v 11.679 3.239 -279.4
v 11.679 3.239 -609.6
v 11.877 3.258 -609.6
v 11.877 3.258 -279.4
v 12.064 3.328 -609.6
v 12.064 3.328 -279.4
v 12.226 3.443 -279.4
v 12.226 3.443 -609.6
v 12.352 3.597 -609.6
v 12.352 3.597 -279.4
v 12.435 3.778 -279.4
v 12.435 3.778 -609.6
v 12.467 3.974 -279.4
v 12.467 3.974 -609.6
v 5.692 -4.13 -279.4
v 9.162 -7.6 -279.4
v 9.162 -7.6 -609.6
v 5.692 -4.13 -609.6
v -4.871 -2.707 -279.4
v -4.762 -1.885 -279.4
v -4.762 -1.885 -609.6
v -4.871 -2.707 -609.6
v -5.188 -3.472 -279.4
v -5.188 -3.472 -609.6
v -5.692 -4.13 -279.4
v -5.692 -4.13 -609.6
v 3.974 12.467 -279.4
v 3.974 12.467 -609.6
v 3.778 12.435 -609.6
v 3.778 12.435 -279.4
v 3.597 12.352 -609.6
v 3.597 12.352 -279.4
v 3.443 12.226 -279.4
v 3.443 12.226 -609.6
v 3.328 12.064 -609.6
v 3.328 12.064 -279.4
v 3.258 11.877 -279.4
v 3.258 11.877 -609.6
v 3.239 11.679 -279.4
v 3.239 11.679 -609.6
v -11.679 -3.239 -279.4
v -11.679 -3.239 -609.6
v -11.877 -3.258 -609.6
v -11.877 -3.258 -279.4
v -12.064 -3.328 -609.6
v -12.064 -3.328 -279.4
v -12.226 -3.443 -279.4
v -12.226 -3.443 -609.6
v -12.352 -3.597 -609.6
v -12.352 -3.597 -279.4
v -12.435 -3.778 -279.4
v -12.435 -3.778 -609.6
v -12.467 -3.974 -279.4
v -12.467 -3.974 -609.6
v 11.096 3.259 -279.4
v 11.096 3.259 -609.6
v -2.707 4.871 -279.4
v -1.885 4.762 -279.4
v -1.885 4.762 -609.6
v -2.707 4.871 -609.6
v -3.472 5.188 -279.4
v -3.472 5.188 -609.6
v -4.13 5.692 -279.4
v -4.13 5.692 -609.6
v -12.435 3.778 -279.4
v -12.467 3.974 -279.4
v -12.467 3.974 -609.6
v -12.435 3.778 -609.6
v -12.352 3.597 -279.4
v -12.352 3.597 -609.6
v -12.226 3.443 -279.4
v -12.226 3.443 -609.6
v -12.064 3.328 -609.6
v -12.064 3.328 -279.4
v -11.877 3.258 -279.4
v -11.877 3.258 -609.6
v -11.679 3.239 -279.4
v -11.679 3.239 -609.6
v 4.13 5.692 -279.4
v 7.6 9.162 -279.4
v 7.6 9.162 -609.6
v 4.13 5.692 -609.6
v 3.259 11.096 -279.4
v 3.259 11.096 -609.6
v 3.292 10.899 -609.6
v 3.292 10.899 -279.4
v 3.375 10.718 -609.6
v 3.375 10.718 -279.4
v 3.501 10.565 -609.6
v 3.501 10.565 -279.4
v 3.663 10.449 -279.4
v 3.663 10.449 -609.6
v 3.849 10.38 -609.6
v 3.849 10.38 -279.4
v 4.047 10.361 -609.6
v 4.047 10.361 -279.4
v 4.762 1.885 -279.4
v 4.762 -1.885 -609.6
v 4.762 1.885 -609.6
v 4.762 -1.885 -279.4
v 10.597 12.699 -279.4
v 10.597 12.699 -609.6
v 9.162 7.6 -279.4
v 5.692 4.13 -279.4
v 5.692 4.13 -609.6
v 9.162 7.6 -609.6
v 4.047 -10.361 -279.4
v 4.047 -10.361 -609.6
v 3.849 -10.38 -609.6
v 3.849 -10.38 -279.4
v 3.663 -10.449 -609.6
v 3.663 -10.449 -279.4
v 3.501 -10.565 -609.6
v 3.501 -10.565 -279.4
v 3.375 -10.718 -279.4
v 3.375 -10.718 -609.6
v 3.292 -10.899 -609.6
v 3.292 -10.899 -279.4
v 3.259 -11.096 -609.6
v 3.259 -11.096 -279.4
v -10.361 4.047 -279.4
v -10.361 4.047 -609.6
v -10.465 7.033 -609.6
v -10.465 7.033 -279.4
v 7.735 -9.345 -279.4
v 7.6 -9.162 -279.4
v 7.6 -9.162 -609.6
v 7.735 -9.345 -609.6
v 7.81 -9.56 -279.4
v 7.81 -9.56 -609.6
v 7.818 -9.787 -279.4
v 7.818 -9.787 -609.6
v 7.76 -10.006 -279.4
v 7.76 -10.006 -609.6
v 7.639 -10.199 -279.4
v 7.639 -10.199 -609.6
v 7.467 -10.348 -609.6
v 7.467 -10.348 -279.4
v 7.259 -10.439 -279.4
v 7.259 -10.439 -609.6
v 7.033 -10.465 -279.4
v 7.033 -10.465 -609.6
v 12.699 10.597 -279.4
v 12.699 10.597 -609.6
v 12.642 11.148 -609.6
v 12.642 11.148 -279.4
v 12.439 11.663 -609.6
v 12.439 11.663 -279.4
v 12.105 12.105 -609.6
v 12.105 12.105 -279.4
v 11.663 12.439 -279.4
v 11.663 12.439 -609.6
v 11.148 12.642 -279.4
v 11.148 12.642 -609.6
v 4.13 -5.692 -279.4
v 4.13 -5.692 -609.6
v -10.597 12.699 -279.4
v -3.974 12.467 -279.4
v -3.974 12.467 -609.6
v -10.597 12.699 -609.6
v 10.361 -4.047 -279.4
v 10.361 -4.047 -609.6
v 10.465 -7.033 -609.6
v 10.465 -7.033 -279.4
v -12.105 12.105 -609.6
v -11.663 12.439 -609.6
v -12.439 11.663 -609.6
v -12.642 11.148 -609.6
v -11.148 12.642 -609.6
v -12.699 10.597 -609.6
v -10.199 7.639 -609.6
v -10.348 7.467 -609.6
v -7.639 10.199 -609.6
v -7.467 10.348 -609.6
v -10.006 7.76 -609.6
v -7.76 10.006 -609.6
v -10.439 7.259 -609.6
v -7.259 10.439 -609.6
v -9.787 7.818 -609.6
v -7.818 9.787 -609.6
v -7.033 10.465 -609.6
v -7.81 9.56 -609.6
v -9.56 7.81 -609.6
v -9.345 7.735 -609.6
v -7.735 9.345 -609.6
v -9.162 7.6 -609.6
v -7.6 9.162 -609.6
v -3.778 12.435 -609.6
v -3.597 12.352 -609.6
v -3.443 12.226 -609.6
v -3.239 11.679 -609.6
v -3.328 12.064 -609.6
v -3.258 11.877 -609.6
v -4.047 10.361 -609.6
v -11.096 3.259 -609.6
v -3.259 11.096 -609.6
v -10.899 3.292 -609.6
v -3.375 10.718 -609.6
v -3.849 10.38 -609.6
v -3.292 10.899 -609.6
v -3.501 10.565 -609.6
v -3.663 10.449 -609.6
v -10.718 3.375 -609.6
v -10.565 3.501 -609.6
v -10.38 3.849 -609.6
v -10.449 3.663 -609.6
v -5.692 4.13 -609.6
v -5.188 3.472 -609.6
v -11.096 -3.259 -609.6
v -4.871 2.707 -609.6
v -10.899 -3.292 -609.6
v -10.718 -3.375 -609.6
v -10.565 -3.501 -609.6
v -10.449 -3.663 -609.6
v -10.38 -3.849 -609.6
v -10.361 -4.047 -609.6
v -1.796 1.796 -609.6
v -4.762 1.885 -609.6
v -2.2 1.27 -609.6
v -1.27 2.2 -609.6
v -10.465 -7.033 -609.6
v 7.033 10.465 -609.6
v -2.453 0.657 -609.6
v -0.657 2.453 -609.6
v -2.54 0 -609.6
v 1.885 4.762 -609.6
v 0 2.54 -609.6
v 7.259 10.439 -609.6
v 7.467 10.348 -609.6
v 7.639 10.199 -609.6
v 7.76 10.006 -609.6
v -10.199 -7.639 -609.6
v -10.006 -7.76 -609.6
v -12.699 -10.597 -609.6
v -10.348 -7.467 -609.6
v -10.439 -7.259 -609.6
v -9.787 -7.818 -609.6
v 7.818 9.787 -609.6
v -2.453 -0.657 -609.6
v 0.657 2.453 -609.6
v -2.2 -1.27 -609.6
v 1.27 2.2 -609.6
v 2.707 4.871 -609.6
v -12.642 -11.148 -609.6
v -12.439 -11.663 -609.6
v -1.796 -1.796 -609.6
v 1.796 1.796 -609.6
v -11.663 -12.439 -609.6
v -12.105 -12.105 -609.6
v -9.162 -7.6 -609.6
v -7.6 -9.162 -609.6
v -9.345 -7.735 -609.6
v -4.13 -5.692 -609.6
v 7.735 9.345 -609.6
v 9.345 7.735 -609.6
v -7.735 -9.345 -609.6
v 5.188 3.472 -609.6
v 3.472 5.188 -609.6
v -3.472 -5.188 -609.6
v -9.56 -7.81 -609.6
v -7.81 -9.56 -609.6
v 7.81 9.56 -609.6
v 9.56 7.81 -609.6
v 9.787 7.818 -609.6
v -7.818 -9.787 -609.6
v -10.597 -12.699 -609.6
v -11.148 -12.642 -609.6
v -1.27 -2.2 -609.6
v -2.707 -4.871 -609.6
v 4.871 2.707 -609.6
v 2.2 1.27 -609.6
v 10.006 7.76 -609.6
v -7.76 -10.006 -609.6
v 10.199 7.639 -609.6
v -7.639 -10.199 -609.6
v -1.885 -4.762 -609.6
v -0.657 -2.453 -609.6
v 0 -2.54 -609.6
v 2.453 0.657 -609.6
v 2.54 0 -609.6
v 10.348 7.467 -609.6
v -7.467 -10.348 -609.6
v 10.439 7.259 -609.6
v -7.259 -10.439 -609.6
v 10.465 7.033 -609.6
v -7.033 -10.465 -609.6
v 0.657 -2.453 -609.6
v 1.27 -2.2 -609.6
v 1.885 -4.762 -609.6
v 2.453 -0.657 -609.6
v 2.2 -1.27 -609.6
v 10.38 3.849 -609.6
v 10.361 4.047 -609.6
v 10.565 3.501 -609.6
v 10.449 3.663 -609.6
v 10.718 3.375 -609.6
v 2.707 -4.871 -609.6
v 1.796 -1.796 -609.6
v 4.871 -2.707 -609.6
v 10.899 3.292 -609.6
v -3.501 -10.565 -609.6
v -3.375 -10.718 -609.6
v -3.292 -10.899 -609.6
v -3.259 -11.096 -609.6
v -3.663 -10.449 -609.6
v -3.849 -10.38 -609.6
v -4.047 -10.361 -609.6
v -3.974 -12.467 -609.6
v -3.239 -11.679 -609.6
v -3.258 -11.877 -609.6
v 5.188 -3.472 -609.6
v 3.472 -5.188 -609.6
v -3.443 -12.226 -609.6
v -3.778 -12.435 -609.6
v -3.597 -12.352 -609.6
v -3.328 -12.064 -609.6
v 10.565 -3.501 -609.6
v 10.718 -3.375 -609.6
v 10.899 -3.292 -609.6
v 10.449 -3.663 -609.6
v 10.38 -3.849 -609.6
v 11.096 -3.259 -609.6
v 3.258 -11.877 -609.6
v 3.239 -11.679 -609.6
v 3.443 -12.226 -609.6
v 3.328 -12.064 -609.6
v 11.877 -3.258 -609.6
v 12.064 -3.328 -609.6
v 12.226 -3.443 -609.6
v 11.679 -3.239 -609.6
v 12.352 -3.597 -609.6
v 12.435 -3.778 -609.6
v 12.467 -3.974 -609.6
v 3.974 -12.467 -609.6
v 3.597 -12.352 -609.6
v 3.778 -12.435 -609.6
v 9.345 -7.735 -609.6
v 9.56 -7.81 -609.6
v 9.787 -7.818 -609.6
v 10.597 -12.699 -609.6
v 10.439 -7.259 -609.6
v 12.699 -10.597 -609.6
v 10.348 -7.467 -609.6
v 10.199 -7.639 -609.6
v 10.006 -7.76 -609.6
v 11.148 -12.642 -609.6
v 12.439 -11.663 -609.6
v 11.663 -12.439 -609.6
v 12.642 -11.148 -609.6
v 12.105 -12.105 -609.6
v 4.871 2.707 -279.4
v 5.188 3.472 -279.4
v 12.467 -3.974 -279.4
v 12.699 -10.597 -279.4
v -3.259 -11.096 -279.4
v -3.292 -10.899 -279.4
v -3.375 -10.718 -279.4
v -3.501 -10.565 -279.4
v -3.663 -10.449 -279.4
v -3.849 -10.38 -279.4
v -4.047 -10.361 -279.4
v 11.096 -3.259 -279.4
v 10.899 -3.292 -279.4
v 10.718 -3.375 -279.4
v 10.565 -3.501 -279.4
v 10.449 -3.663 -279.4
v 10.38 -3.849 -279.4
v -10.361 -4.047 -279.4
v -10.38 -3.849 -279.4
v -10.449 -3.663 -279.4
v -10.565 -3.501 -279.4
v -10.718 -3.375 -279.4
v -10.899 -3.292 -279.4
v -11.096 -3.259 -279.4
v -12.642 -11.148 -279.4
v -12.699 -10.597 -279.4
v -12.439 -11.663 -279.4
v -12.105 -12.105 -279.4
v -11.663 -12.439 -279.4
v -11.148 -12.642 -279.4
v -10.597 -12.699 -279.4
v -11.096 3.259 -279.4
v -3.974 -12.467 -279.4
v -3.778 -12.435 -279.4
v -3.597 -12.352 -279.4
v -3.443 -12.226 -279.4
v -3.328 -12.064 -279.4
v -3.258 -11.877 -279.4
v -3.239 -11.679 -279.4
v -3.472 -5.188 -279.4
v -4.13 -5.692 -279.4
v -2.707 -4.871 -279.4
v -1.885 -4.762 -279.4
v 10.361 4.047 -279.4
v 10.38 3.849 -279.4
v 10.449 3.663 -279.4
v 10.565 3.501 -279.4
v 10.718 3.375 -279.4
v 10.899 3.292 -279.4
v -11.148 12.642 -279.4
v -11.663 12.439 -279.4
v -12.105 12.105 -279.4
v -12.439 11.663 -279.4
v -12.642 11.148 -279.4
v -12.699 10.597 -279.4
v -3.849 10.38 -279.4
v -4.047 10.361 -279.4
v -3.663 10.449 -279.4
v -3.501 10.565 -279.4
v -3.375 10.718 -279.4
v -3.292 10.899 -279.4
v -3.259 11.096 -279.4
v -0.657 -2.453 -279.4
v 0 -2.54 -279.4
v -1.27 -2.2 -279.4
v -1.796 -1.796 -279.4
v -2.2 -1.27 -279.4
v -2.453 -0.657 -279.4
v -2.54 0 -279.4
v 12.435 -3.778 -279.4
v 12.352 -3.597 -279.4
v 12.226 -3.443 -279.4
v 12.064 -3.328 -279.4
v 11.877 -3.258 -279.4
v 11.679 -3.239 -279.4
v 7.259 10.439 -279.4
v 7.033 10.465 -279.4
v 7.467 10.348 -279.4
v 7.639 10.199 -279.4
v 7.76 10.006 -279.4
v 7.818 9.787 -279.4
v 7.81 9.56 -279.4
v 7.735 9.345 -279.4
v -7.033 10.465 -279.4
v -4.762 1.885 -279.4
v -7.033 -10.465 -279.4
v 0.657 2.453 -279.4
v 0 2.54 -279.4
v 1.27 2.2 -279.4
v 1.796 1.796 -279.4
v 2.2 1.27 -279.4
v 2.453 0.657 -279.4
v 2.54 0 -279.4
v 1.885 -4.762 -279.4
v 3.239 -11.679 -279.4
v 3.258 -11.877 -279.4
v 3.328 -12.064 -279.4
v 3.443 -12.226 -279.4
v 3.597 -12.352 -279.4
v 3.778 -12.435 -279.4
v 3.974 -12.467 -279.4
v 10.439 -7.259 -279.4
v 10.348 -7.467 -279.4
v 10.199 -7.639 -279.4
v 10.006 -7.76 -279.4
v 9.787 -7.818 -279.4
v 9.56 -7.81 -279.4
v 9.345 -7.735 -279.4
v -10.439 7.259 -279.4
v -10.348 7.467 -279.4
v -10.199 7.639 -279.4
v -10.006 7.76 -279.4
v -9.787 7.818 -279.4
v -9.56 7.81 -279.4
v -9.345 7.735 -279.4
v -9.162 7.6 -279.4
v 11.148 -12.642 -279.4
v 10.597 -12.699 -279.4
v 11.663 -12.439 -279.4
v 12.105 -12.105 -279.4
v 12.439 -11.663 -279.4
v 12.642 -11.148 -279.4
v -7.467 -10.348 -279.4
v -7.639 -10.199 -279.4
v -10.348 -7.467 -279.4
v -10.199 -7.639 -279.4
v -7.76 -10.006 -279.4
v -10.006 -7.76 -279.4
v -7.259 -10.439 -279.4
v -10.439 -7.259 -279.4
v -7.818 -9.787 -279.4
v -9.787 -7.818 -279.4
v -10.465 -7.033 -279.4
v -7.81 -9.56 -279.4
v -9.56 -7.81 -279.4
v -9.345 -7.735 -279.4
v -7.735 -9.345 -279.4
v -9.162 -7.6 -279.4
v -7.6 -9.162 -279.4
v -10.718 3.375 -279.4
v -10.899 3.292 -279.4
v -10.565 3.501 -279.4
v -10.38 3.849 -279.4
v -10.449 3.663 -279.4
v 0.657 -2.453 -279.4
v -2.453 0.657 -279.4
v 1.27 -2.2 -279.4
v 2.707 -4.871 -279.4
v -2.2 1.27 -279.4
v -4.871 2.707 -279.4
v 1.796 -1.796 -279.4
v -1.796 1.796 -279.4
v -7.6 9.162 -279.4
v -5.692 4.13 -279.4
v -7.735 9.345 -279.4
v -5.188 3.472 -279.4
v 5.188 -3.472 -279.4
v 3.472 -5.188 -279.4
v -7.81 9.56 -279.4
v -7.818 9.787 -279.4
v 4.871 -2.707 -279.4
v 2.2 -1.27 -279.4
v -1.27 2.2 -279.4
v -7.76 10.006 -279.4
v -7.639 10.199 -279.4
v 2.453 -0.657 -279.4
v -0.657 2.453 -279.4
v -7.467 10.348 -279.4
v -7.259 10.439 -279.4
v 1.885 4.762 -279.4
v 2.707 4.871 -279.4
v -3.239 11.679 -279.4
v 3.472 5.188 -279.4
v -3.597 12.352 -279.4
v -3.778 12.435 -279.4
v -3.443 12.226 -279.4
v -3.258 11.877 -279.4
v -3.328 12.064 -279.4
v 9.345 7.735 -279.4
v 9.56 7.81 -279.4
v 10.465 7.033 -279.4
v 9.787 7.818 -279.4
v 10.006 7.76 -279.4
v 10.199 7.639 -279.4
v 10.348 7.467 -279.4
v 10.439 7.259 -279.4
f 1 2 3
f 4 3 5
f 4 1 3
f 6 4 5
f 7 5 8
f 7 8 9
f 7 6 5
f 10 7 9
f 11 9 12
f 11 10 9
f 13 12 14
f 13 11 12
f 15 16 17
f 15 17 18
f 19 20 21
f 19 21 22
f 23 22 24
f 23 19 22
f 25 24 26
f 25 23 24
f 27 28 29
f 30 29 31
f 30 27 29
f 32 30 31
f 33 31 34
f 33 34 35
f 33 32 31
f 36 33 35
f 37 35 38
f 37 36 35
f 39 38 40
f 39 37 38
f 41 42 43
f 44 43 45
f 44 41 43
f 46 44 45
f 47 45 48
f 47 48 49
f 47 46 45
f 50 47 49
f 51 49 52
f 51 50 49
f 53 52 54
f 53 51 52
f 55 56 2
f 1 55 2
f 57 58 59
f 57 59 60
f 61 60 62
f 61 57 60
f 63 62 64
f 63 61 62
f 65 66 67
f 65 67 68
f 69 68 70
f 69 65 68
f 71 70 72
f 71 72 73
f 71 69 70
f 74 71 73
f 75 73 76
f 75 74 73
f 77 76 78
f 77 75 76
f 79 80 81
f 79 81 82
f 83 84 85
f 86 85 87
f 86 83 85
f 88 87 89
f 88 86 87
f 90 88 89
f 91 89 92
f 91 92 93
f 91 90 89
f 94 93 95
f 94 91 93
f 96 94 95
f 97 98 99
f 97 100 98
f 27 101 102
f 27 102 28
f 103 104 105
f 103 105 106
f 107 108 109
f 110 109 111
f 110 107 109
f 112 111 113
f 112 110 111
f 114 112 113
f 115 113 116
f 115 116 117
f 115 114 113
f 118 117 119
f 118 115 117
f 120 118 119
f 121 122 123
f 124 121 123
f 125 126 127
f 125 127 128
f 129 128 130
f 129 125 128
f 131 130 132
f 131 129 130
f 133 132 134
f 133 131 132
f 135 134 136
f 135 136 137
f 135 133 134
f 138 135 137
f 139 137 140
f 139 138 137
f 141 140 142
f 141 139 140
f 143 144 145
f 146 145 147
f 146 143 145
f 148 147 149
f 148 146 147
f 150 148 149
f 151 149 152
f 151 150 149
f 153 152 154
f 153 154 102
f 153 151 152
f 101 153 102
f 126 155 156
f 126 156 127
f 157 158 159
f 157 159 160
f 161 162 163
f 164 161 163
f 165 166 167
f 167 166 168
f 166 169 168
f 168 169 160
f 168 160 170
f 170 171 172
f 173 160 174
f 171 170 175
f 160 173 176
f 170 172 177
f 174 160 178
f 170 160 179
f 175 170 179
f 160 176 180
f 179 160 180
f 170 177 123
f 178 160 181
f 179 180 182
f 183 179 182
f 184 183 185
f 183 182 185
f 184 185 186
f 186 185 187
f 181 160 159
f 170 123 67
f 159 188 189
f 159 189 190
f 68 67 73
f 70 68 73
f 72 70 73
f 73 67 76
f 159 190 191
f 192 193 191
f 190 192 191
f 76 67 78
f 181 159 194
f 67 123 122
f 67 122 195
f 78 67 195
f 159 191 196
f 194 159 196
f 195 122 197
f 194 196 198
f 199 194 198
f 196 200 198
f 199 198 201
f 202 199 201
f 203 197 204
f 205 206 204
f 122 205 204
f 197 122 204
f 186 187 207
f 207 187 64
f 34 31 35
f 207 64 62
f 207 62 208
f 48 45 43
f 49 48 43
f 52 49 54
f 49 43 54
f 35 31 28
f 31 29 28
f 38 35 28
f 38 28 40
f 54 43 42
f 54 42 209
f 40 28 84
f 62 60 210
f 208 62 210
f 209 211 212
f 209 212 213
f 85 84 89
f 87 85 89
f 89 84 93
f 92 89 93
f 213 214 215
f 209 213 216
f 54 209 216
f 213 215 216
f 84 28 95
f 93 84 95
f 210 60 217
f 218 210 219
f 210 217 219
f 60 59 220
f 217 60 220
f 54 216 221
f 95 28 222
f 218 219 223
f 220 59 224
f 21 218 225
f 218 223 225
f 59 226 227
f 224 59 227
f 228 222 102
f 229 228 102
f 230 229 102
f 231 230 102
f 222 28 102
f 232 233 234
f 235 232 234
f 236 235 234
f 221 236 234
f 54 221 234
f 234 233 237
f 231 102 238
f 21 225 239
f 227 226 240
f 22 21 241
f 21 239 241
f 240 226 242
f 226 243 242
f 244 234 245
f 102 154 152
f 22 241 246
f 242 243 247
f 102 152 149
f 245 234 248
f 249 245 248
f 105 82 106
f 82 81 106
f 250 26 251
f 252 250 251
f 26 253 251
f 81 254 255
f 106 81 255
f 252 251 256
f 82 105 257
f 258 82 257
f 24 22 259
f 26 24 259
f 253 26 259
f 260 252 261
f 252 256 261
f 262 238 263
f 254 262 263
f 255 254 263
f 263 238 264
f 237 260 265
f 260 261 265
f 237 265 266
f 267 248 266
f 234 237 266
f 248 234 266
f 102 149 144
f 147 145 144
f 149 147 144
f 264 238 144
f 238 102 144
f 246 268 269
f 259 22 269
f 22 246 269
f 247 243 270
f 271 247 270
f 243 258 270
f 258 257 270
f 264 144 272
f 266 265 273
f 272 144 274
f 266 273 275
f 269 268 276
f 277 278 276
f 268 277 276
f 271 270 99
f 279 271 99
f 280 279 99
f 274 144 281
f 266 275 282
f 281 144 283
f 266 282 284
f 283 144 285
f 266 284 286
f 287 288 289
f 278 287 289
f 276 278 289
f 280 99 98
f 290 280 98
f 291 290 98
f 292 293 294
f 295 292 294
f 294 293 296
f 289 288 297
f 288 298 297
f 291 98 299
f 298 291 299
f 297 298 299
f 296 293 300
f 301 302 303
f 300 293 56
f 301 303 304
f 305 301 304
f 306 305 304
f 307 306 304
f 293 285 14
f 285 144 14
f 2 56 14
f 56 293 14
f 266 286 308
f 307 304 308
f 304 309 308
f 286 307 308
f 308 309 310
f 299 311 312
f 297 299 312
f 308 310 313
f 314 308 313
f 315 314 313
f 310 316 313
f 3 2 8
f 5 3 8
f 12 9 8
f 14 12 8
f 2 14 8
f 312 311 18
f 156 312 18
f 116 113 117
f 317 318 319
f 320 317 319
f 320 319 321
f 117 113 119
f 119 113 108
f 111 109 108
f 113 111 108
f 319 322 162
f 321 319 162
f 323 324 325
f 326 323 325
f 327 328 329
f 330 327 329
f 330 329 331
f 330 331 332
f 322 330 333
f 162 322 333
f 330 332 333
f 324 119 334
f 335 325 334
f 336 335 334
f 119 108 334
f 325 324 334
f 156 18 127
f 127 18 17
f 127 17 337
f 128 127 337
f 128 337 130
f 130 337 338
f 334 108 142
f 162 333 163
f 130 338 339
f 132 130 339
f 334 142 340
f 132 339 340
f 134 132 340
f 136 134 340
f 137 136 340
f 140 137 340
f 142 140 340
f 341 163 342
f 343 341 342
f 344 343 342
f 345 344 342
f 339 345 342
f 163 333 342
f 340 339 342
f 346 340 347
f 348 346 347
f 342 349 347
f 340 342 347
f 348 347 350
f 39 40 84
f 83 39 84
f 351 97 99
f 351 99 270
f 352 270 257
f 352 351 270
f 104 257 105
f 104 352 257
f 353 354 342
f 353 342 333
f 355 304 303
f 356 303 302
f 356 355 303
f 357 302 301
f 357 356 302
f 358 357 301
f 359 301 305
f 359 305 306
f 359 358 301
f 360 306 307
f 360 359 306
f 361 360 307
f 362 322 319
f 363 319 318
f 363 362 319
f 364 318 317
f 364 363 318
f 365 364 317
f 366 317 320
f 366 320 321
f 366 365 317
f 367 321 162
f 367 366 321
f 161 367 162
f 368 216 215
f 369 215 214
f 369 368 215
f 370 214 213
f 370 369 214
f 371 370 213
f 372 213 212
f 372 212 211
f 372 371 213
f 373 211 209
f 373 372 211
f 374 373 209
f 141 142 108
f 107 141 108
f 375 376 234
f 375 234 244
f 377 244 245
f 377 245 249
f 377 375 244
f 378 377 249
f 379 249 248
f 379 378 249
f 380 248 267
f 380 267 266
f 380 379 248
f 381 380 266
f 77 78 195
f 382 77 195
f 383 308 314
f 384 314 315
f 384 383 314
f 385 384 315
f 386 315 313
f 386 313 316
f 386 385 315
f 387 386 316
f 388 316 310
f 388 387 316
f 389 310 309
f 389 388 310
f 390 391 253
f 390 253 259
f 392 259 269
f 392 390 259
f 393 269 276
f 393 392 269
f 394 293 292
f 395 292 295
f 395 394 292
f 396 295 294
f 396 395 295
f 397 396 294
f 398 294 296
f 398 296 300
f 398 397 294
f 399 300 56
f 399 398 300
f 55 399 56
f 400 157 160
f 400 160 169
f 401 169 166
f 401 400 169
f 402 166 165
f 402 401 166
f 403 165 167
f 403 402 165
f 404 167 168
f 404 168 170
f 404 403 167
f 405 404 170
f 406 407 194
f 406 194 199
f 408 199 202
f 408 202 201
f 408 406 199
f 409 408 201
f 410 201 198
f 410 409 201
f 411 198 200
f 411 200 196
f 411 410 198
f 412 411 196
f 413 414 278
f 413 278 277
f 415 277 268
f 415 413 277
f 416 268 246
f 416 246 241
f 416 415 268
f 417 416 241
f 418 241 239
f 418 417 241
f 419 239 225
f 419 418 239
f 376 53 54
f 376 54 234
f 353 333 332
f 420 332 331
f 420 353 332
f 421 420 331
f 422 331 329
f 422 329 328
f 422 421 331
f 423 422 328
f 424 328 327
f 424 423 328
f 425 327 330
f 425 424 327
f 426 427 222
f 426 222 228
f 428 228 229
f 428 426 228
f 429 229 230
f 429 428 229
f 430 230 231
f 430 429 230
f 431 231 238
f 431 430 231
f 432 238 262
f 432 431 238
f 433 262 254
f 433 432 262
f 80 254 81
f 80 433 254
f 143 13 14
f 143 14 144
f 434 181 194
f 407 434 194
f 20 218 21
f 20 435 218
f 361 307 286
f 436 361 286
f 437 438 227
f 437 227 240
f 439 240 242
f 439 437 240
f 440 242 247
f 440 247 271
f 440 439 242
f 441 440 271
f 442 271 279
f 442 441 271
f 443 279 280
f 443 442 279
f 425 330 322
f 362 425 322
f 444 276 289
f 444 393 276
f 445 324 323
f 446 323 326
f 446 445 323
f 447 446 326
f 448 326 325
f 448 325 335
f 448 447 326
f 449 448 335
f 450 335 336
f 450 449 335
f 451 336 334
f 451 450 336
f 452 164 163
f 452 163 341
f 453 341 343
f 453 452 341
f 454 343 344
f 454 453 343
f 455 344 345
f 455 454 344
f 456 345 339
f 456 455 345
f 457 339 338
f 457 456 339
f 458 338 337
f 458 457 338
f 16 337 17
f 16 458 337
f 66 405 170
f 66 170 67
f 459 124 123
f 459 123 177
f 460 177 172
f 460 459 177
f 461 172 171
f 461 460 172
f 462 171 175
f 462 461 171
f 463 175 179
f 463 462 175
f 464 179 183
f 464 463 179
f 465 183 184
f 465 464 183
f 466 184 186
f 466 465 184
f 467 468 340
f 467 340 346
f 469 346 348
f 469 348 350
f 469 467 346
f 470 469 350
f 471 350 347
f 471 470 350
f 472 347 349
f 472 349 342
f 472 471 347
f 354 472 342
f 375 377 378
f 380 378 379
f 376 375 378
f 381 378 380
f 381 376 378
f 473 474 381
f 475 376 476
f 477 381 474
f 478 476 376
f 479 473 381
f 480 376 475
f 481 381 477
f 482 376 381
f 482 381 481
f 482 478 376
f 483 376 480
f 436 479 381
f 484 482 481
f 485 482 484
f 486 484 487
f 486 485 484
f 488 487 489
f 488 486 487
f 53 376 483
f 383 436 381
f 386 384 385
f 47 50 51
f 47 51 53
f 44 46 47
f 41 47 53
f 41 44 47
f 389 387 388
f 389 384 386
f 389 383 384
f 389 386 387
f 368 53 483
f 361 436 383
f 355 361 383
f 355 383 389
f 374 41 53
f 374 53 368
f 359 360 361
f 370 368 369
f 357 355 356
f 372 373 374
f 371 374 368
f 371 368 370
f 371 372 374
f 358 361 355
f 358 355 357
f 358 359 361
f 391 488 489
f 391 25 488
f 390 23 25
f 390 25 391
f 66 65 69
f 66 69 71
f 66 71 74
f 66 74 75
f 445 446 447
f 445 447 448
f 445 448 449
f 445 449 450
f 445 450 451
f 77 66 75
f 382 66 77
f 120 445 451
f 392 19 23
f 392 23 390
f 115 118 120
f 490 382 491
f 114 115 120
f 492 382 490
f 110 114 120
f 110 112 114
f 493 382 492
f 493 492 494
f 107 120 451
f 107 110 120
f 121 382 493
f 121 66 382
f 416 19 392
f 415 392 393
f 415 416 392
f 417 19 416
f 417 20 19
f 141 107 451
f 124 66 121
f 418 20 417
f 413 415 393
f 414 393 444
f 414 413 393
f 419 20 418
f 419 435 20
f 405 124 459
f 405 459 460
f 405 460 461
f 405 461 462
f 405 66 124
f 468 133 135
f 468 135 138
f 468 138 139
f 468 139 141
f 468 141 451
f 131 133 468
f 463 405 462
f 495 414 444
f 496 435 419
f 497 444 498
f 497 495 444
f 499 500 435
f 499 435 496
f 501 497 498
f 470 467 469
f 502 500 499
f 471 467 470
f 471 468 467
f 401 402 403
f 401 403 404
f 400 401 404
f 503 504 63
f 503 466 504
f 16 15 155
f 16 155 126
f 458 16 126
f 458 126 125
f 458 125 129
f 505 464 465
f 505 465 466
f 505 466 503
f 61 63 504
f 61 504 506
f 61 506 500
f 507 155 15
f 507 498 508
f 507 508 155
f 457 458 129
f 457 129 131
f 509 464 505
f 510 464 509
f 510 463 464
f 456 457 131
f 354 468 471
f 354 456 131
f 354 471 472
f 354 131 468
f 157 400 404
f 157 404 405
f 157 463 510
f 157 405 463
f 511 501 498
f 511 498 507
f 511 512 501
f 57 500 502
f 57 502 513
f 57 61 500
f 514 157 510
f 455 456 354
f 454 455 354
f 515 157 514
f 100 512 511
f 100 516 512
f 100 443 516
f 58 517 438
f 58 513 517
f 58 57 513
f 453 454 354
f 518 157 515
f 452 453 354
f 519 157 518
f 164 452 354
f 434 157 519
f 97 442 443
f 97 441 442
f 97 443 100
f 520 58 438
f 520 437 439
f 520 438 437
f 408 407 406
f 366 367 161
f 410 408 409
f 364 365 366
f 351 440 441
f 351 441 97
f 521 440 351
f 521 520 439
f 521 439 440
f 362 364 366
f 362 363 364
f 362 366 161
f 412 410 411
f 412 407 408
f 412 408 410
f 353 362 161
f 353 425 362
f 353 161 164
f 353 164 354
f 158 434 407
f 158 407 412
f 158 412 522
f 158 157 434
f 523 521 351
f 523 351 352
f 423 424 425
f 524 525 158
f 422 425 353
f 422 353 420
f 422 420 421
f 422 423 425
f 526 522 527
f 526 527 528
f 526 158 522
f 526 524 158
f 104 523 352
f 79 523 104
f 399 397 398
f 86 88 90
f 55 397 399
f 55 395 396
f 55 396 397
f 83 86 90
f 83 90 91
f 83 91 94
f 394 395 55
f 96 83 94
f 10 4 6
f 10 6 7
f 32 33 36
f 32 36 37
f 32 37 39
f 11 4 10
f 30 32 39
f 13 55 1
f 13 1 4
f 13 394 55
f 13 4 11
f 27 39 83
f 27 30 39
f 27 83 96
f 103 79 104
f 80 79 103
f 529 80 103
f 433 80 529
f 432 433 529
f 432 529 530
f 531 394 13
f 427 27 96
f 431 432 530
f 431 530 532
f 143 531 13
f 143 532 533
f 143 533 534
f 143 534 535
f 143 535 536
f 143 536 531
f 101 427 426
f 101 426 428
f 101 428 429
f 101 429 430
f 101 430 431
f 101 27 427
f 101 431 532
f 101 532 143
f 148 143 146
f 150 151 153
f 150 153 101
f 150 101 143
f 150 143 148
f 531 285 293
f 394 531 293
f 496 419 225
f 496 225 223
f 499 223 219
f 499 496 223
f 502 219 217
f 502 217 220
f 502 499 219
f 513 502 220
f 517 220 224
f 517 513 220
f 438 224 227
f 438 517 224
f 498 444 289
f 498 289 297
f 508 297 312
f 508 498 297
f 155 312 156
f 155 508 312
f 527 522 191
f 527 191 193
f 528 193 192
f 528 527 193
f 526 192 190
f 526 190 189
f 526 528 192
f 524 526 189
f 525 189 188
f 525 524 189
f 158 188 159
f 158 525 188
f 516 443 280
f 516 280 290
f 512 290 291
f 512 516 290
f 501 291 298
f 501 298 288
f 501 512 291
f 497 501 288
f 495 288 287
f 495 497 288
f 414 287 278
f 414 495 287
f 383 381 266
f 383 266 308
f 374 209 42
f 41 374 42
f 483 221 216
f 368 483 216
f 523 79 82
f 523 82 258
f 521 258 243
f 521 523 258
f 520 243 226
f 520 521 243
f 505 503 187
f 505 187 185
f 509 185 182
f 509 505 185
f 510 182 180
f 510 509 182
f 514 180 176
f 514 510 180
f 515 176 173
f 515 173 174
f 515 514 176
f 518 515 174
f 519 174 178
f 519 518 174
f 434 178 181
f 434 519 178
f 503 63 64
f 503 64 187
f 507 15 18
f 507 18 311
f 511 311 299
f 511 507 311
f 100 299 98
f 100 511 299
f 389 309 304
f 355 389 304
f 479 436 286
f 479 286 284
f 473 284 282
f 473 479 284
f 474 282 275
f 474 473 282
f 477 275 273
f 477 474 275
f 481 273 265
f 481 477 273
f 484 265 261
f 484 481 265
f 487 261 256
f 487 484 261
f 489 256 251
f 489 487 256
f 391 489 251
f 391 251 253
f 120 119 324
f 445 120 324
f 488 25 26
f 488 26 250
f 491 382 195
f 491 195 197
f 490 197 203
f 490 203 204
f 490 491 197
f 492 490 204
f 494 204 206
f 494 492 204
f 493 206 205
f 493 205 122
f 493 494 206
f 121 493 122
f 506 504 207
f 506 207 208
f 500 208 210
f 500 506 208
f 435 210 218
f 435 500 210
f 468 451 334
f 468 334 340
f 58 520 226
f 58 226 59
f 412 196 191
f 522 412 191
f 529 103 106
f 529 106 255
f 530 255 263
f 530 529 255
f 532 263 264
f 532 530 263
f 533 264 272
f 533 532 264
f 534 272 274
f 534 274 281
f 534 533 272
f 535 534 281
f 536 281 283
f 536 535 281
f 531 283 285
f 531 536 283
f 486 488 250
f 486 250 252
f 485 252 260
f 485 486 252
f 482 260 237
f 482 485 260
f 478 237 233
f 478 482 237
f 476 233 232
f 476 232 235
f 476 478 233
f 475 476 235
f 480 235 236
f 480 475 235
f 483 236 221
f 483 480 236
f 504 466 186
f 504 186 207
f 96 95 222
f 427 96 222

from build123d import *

# Parameters (mm, degrees)
BOSS_EXTRUDE1_DEPTH = 609.6
CIRPATTERN1_COUNT   = 4
CUT_EXTRUDE1_DEPTH  = 889


with BuildPart() as part:
    # Sketch3 → Boss-Extrude1 (new, symmetric)
    with BuildSketch(Plane.XY):
        with BuildLine():
            Line((0, 4.7625), (-1.884807374, 4.7625))
            ThreePointArc((-1.884807374, 4.7625), (-3.099827272, 5.004182484), (-4.129871405, 5.69243597))
            Line((-4.129871405, 5.69243597), (-7.599623114, 9.162187679))
            ThreePointArc((-7.599623114, 9.162187679), (-7.759888701, 10.006330839), (-7.033220609, 10.464824259))
            Line((-7.033220609, 10.464824259), (-4.047481702, 10.360559959))
            ThreePointArc((-4.047481702, 10.360559959), (-3.501205536, 10.564804249), (-3.259352476, 11.095502353))
            Line((-3.259352476, 11.095502353), (-3.23896419, 11.679346474))
            ThreePointArc((-3.23896419, 11.679346474), (-3.443208479, 12.225622641), (-3.973906584, 12.467475701))
            Line((-3.973906584, 12.467475701), (-10.597084223, 12.698762161))
            ThreePointArc((-10.597084223, 12.698762161), (-12.104840979, 12.104840979), (-12.698762161, 10.597084223))
            Line((-12.698762161, 10.597084223), (-12.467475701, 3.973906584))
            ThreePointArc((-12.467475701, 3.973906584), (-12.225622641, 3.443208479), (-11.679346474, 3.23896419))
            Line((-11.679346474, 3.23896419), (-11.095502353, 3.259352476))
            ThreePointArc((-11.095502353, 3.259352476), (-10.564804249, 3.501205536), (-10.360559959, 4.047481702))
            Line((-10.360559959, 4.047481702), (-10.464824259, 7.033220609))
            ThreePointArc((-10.464824259, 7.033220609), (-10.006330839, 7.759888701), (-9.162187679, 7.599623114))
            Line((-9.162187679, 7.599623114), (-5.69243597, 4.129871405))
            ThreePointArc((-5.69243597, 4.129871405), (-5.004182484, 3.099827272), (-4.7625, 1.884807374))
            Line((-4.7625, 1.884807374), (-4.7625, 0))
            Line((-4.7625, 0), (-2.54, 0))
            ThreePointArc((-2.54, 0), (-1.796051224, 1.796051224), (0, 2.54))
            Line((0, 2.54), (0, 4.7625))
        make_face()
    boss_extrude1 = extrude(amount=BOSS_EXTRUDE1_DEPTH, both=True)

    # CirPattern1: Boss-Extrude1 ×4 about axis
    cirpattern1_axis = Axis((0, 0, 0), (0, 0, 1))
    for i in range(1, CIRPATTERN1_COUNT):
        add(boss_extrude1.rotate(cirpattern1_axis, i * 360 / CIRPATTERN1_COUNT))

    # Sketch4 → Cut-Extrude1 (cut)
    with BuildSketch(Plane.XY.offset(609.6)):
        with BuildLine():
            Line((1.884807374, 4.7625), (-1.884807374, 4.7625))
            ThreePointArc((-1.884807374, 4.7625), (-3.099827272, 5.004182484), (-4.129871405, 5.69243597))
            Line((-4.129871405, 5.69243597), (-7.599623114, 9.162187679))
            ThreePointArc((-7.599623114, 9.162187679), (-7.759888701, 10.006330839), (-7.033220609, 10.464824259))
            Line((-7.033220609, 10.464824259), (-4.047481702, 10.360559959))
            ThreePointArc((-4.047481702, 10.360559959), (-3.501205536, 10.564804249), (-3.259352476, 11.095502353))
            Line((-3.259352476, 11.095502353), (-3.23896419, 11.679346474))
            ThreePointArc((-3.23896419, 11.679346474), (-3.443208479, 12.225622641), (-3.973906584, 12.467475701))
            Line((-3.973906584, 12.467475701), (-10.597084223, 12.698762161))
            ThreePointArc((-10.597084223, 12.698762161), (-12.104840979, 12.104840979), (-12.698762161, 10.597084223))
            Line((-12.698762161, 10.597084223), (-12.467475701, 3.973906584))
            ThreePointArc((-12.467475701, 3.973906584), (-12.225622641, 3.443208479), (-11.679346474, 3.23896419))
            Line((-11.679346474, 3.23896419), (-11.095502353, 3.259352476))
            ThreePointArc((-11.095502353, 3.259352476), (-10.564804249, 3.501205536), (-10.360559959, 4.047481702))
            Line((-10.360559959, 4.047481702), (-10.464824259, 7.033220609))
            ThreePointArc((-10.464824259, 7.033220609), (-10.006330839, 7.759888701), (-9.162187679, 7.599623114))
            Line((-9.162187679, 7.599623114), (-5.69243597, 4.129871405))
            ThreePointArc((-5.69243597, 4.129871405), (-5.004182484, 3.099827272), (-4.7625, 1.884807374))
            Line((-4.7625, 1.884807374), (-4.7625, -1.884807374))
            ThreePointArc((-4.7625, -1.884807374), (-5.004182484, -3.099827272), (-5.69243597, -4.129871405))
            Line((-5.69243597, -4.129871405), (-9.162187679, -7.599623114))
            ThreePointArc((-9.162187679, -7.599623114), (-10.006330839, -7.759888701), (-10.464824259, -7.033220609))
            Line((-10.464824259, -7.033220609), (-10.360559959, -4.047481702))
            ThreePointArc((-10.360559959, -4.047481702), (-10.564804249, -3.501205536), (-11.095502353, -3.259352476))
            Line((-11.095502353, -3.259352476), (-11.679346474, -3.23896419))
            ThreePointArc((-11.679346474, -3.23896419), (-12.225622641, -3.443208479), (-12.467475701, -3.973906584))
            Line((-12.467475701, -3.973906584), (-12.698762161, -10.597084223))
            ThreePointArc((-12.698762161, -10.597084223), (-12.104840979, -12.104840979), (-10.597084223, -12.698762161))
            Line((-10.597084223, -12.698762161), (-3.973906584, -12.467475701))
            ThreePointArc((-3.973906584, -12.467475701), (-3.443208479, -12.225622641), (-3.23896419, -11.679346474))
            Line((-3.23896419, -11.679346474), (-3.259352476, -11.095502353))
            ThreePointArc((-3.259352476, -11.095502353), (-3.501205536, -10.564804249), (-4.047481702, -10.360559959))
            Line((-4.047481702, -10.360559959), (-7.033220609, -10.464824259))
            ThreePointArc((-7.033220609, -10.464824259), (-7.759888701, -10.006330839), (-7.599623114, -9.162187679))
            Line((-7.599623114, -9.162187679), (-4.129871405, -5.69243597))
            ThreePointArc((-4.129871405, -5.69243597), (-3.099827272, -5.004182484), (-1.884807374, -4.7625))
            Line((-1.884807374, -4.7625), (1.884807374, -4.7625))
            ThreePointArc((1.884807374, -4.7625), (3.099827272, -5.004182484), (4.129871405, -5.69243597))
            Line((4.129871405, -5.69243597), (7.599623114, -9.162187679))
            ThreePointArc((7.599623114, -9.162187679), (7.759888701, -10.006330839), (7.033220609, -10.464824259))
            Line((7.033220609, -10.464824259), (4.047481702, -10.360559959))
            ThreePointArc((4.047481702, -10.360559959), (3.501205536, -10.564804249), (3.259352476, -11.095502353))
            Line((3.259352476, -11.095502353), (3.23896419, -11.679346474))
            ThreePointArc((3.23896419, -11.679346474), (3.443208479, -12.225622641), (3.973906584, -12.467475701))
            Line((3.973906584, -12.467475701), (10.597084223, -12.698762161))
            ThreePointArc((10.597084223, -12.698762161), (12.104840979, -12.104840979), (12.698762161, -10.597084223))
            Line((12.698762161, -10.597084223), (12.467475701, -3.973906584))
            ThreePointArc((12.467475701, -3.973906584), (12.225622641, -3.443208479), (11.679346474, -3.23896419))
            Line((11.679346474, -3.23896419), (11.095502353, -3.259352476))
            ThreePointArc((11.095502353, -3.259352476), (10.564804249, -3.501205536), (10.360559959, -4.047481702))
            Line((10.360559959, -4.047481702), (10.464824259, -7.033220609))
            ThreePointArc((10.464824259, -7.033220609), (10.006330839, -7.759888701), (9.162187679, -7.599623114))
            Line((9.162187679, -7.599623114), (5.69243597, -4.129871405))
            ThreePointArc((5.69243597, -4.129871405), (5.004182484, -3.099827272), (4.7625, -1.884807374))
            Line((4.7625, -1.884807374), (4.7625, 1.884807374))
            ThreePointArc((4.7625, 1.884807374), (5.004182484, 3.099827272), (5.69243597, 4.129871405))
            Line((5.69243597, 4.129871405), (9.162187679, 7.599623114))
            ThreePointArc((9.162187679, 7.599623114), (10.006330839, 7.759888701), (10.464824259, 7.033220609))
            Line((10.464824259, 7.033220609), (10.360559959, 4.047481702))
            ThreePointArc((10.360559959, 4.047481702), (10.564804249, 3.501205536), (11.095502353, 3.259352476))
            Line((11.095502353, 3.259352476), (11.679346474, 3.23896419))
            ThreePointArc((11.679346474, 3.23896419), (12.225622641, 3.443208479), (12.467475701, 3.973906584))
            Line((12.467475701, 3.973906584), (12.698762161, 10.597084223))
            ThreePointArc((12.698762161, 10.597084223), (12.104840979, 12.104840979), (10.597084223, 12.698762161))
            Line((10.597084223, 12.698762161), (3.973906584, 12.467475701))
            ThreePointArc((3.973906584, 12.467475701), (3.443208479, 12.225622641), (3.23896419, 11.679346474))
            Line((3.23896419, 11.679346474), (3.259352476, 11.095502353))
            ThreePointArc((3.259352476, 11.095502353), (3.501205536, 10.564804249), (4.047481702, 10.360559959))
            Line((4.047481702, 10.360559959), (7.033220609, 10.464824259))
            ThreePointArc((7.033220609, 10.464824259), (7.759888701, 10.006330839), (7.599623114, 9.162187679))
            Line((7.599623114, 9.162187679), (4.129871405, 5.69243597))
            ThreePointArc((4.129871405, 5.69243597), (3.099827272, 5.004182484), (1.884807374, 4.7625))
        make_face()
    extrude(amount=-CUT_EXTRUDE1_DEPTH, mode=Mode.SUBTRACT)


solid = part.part
